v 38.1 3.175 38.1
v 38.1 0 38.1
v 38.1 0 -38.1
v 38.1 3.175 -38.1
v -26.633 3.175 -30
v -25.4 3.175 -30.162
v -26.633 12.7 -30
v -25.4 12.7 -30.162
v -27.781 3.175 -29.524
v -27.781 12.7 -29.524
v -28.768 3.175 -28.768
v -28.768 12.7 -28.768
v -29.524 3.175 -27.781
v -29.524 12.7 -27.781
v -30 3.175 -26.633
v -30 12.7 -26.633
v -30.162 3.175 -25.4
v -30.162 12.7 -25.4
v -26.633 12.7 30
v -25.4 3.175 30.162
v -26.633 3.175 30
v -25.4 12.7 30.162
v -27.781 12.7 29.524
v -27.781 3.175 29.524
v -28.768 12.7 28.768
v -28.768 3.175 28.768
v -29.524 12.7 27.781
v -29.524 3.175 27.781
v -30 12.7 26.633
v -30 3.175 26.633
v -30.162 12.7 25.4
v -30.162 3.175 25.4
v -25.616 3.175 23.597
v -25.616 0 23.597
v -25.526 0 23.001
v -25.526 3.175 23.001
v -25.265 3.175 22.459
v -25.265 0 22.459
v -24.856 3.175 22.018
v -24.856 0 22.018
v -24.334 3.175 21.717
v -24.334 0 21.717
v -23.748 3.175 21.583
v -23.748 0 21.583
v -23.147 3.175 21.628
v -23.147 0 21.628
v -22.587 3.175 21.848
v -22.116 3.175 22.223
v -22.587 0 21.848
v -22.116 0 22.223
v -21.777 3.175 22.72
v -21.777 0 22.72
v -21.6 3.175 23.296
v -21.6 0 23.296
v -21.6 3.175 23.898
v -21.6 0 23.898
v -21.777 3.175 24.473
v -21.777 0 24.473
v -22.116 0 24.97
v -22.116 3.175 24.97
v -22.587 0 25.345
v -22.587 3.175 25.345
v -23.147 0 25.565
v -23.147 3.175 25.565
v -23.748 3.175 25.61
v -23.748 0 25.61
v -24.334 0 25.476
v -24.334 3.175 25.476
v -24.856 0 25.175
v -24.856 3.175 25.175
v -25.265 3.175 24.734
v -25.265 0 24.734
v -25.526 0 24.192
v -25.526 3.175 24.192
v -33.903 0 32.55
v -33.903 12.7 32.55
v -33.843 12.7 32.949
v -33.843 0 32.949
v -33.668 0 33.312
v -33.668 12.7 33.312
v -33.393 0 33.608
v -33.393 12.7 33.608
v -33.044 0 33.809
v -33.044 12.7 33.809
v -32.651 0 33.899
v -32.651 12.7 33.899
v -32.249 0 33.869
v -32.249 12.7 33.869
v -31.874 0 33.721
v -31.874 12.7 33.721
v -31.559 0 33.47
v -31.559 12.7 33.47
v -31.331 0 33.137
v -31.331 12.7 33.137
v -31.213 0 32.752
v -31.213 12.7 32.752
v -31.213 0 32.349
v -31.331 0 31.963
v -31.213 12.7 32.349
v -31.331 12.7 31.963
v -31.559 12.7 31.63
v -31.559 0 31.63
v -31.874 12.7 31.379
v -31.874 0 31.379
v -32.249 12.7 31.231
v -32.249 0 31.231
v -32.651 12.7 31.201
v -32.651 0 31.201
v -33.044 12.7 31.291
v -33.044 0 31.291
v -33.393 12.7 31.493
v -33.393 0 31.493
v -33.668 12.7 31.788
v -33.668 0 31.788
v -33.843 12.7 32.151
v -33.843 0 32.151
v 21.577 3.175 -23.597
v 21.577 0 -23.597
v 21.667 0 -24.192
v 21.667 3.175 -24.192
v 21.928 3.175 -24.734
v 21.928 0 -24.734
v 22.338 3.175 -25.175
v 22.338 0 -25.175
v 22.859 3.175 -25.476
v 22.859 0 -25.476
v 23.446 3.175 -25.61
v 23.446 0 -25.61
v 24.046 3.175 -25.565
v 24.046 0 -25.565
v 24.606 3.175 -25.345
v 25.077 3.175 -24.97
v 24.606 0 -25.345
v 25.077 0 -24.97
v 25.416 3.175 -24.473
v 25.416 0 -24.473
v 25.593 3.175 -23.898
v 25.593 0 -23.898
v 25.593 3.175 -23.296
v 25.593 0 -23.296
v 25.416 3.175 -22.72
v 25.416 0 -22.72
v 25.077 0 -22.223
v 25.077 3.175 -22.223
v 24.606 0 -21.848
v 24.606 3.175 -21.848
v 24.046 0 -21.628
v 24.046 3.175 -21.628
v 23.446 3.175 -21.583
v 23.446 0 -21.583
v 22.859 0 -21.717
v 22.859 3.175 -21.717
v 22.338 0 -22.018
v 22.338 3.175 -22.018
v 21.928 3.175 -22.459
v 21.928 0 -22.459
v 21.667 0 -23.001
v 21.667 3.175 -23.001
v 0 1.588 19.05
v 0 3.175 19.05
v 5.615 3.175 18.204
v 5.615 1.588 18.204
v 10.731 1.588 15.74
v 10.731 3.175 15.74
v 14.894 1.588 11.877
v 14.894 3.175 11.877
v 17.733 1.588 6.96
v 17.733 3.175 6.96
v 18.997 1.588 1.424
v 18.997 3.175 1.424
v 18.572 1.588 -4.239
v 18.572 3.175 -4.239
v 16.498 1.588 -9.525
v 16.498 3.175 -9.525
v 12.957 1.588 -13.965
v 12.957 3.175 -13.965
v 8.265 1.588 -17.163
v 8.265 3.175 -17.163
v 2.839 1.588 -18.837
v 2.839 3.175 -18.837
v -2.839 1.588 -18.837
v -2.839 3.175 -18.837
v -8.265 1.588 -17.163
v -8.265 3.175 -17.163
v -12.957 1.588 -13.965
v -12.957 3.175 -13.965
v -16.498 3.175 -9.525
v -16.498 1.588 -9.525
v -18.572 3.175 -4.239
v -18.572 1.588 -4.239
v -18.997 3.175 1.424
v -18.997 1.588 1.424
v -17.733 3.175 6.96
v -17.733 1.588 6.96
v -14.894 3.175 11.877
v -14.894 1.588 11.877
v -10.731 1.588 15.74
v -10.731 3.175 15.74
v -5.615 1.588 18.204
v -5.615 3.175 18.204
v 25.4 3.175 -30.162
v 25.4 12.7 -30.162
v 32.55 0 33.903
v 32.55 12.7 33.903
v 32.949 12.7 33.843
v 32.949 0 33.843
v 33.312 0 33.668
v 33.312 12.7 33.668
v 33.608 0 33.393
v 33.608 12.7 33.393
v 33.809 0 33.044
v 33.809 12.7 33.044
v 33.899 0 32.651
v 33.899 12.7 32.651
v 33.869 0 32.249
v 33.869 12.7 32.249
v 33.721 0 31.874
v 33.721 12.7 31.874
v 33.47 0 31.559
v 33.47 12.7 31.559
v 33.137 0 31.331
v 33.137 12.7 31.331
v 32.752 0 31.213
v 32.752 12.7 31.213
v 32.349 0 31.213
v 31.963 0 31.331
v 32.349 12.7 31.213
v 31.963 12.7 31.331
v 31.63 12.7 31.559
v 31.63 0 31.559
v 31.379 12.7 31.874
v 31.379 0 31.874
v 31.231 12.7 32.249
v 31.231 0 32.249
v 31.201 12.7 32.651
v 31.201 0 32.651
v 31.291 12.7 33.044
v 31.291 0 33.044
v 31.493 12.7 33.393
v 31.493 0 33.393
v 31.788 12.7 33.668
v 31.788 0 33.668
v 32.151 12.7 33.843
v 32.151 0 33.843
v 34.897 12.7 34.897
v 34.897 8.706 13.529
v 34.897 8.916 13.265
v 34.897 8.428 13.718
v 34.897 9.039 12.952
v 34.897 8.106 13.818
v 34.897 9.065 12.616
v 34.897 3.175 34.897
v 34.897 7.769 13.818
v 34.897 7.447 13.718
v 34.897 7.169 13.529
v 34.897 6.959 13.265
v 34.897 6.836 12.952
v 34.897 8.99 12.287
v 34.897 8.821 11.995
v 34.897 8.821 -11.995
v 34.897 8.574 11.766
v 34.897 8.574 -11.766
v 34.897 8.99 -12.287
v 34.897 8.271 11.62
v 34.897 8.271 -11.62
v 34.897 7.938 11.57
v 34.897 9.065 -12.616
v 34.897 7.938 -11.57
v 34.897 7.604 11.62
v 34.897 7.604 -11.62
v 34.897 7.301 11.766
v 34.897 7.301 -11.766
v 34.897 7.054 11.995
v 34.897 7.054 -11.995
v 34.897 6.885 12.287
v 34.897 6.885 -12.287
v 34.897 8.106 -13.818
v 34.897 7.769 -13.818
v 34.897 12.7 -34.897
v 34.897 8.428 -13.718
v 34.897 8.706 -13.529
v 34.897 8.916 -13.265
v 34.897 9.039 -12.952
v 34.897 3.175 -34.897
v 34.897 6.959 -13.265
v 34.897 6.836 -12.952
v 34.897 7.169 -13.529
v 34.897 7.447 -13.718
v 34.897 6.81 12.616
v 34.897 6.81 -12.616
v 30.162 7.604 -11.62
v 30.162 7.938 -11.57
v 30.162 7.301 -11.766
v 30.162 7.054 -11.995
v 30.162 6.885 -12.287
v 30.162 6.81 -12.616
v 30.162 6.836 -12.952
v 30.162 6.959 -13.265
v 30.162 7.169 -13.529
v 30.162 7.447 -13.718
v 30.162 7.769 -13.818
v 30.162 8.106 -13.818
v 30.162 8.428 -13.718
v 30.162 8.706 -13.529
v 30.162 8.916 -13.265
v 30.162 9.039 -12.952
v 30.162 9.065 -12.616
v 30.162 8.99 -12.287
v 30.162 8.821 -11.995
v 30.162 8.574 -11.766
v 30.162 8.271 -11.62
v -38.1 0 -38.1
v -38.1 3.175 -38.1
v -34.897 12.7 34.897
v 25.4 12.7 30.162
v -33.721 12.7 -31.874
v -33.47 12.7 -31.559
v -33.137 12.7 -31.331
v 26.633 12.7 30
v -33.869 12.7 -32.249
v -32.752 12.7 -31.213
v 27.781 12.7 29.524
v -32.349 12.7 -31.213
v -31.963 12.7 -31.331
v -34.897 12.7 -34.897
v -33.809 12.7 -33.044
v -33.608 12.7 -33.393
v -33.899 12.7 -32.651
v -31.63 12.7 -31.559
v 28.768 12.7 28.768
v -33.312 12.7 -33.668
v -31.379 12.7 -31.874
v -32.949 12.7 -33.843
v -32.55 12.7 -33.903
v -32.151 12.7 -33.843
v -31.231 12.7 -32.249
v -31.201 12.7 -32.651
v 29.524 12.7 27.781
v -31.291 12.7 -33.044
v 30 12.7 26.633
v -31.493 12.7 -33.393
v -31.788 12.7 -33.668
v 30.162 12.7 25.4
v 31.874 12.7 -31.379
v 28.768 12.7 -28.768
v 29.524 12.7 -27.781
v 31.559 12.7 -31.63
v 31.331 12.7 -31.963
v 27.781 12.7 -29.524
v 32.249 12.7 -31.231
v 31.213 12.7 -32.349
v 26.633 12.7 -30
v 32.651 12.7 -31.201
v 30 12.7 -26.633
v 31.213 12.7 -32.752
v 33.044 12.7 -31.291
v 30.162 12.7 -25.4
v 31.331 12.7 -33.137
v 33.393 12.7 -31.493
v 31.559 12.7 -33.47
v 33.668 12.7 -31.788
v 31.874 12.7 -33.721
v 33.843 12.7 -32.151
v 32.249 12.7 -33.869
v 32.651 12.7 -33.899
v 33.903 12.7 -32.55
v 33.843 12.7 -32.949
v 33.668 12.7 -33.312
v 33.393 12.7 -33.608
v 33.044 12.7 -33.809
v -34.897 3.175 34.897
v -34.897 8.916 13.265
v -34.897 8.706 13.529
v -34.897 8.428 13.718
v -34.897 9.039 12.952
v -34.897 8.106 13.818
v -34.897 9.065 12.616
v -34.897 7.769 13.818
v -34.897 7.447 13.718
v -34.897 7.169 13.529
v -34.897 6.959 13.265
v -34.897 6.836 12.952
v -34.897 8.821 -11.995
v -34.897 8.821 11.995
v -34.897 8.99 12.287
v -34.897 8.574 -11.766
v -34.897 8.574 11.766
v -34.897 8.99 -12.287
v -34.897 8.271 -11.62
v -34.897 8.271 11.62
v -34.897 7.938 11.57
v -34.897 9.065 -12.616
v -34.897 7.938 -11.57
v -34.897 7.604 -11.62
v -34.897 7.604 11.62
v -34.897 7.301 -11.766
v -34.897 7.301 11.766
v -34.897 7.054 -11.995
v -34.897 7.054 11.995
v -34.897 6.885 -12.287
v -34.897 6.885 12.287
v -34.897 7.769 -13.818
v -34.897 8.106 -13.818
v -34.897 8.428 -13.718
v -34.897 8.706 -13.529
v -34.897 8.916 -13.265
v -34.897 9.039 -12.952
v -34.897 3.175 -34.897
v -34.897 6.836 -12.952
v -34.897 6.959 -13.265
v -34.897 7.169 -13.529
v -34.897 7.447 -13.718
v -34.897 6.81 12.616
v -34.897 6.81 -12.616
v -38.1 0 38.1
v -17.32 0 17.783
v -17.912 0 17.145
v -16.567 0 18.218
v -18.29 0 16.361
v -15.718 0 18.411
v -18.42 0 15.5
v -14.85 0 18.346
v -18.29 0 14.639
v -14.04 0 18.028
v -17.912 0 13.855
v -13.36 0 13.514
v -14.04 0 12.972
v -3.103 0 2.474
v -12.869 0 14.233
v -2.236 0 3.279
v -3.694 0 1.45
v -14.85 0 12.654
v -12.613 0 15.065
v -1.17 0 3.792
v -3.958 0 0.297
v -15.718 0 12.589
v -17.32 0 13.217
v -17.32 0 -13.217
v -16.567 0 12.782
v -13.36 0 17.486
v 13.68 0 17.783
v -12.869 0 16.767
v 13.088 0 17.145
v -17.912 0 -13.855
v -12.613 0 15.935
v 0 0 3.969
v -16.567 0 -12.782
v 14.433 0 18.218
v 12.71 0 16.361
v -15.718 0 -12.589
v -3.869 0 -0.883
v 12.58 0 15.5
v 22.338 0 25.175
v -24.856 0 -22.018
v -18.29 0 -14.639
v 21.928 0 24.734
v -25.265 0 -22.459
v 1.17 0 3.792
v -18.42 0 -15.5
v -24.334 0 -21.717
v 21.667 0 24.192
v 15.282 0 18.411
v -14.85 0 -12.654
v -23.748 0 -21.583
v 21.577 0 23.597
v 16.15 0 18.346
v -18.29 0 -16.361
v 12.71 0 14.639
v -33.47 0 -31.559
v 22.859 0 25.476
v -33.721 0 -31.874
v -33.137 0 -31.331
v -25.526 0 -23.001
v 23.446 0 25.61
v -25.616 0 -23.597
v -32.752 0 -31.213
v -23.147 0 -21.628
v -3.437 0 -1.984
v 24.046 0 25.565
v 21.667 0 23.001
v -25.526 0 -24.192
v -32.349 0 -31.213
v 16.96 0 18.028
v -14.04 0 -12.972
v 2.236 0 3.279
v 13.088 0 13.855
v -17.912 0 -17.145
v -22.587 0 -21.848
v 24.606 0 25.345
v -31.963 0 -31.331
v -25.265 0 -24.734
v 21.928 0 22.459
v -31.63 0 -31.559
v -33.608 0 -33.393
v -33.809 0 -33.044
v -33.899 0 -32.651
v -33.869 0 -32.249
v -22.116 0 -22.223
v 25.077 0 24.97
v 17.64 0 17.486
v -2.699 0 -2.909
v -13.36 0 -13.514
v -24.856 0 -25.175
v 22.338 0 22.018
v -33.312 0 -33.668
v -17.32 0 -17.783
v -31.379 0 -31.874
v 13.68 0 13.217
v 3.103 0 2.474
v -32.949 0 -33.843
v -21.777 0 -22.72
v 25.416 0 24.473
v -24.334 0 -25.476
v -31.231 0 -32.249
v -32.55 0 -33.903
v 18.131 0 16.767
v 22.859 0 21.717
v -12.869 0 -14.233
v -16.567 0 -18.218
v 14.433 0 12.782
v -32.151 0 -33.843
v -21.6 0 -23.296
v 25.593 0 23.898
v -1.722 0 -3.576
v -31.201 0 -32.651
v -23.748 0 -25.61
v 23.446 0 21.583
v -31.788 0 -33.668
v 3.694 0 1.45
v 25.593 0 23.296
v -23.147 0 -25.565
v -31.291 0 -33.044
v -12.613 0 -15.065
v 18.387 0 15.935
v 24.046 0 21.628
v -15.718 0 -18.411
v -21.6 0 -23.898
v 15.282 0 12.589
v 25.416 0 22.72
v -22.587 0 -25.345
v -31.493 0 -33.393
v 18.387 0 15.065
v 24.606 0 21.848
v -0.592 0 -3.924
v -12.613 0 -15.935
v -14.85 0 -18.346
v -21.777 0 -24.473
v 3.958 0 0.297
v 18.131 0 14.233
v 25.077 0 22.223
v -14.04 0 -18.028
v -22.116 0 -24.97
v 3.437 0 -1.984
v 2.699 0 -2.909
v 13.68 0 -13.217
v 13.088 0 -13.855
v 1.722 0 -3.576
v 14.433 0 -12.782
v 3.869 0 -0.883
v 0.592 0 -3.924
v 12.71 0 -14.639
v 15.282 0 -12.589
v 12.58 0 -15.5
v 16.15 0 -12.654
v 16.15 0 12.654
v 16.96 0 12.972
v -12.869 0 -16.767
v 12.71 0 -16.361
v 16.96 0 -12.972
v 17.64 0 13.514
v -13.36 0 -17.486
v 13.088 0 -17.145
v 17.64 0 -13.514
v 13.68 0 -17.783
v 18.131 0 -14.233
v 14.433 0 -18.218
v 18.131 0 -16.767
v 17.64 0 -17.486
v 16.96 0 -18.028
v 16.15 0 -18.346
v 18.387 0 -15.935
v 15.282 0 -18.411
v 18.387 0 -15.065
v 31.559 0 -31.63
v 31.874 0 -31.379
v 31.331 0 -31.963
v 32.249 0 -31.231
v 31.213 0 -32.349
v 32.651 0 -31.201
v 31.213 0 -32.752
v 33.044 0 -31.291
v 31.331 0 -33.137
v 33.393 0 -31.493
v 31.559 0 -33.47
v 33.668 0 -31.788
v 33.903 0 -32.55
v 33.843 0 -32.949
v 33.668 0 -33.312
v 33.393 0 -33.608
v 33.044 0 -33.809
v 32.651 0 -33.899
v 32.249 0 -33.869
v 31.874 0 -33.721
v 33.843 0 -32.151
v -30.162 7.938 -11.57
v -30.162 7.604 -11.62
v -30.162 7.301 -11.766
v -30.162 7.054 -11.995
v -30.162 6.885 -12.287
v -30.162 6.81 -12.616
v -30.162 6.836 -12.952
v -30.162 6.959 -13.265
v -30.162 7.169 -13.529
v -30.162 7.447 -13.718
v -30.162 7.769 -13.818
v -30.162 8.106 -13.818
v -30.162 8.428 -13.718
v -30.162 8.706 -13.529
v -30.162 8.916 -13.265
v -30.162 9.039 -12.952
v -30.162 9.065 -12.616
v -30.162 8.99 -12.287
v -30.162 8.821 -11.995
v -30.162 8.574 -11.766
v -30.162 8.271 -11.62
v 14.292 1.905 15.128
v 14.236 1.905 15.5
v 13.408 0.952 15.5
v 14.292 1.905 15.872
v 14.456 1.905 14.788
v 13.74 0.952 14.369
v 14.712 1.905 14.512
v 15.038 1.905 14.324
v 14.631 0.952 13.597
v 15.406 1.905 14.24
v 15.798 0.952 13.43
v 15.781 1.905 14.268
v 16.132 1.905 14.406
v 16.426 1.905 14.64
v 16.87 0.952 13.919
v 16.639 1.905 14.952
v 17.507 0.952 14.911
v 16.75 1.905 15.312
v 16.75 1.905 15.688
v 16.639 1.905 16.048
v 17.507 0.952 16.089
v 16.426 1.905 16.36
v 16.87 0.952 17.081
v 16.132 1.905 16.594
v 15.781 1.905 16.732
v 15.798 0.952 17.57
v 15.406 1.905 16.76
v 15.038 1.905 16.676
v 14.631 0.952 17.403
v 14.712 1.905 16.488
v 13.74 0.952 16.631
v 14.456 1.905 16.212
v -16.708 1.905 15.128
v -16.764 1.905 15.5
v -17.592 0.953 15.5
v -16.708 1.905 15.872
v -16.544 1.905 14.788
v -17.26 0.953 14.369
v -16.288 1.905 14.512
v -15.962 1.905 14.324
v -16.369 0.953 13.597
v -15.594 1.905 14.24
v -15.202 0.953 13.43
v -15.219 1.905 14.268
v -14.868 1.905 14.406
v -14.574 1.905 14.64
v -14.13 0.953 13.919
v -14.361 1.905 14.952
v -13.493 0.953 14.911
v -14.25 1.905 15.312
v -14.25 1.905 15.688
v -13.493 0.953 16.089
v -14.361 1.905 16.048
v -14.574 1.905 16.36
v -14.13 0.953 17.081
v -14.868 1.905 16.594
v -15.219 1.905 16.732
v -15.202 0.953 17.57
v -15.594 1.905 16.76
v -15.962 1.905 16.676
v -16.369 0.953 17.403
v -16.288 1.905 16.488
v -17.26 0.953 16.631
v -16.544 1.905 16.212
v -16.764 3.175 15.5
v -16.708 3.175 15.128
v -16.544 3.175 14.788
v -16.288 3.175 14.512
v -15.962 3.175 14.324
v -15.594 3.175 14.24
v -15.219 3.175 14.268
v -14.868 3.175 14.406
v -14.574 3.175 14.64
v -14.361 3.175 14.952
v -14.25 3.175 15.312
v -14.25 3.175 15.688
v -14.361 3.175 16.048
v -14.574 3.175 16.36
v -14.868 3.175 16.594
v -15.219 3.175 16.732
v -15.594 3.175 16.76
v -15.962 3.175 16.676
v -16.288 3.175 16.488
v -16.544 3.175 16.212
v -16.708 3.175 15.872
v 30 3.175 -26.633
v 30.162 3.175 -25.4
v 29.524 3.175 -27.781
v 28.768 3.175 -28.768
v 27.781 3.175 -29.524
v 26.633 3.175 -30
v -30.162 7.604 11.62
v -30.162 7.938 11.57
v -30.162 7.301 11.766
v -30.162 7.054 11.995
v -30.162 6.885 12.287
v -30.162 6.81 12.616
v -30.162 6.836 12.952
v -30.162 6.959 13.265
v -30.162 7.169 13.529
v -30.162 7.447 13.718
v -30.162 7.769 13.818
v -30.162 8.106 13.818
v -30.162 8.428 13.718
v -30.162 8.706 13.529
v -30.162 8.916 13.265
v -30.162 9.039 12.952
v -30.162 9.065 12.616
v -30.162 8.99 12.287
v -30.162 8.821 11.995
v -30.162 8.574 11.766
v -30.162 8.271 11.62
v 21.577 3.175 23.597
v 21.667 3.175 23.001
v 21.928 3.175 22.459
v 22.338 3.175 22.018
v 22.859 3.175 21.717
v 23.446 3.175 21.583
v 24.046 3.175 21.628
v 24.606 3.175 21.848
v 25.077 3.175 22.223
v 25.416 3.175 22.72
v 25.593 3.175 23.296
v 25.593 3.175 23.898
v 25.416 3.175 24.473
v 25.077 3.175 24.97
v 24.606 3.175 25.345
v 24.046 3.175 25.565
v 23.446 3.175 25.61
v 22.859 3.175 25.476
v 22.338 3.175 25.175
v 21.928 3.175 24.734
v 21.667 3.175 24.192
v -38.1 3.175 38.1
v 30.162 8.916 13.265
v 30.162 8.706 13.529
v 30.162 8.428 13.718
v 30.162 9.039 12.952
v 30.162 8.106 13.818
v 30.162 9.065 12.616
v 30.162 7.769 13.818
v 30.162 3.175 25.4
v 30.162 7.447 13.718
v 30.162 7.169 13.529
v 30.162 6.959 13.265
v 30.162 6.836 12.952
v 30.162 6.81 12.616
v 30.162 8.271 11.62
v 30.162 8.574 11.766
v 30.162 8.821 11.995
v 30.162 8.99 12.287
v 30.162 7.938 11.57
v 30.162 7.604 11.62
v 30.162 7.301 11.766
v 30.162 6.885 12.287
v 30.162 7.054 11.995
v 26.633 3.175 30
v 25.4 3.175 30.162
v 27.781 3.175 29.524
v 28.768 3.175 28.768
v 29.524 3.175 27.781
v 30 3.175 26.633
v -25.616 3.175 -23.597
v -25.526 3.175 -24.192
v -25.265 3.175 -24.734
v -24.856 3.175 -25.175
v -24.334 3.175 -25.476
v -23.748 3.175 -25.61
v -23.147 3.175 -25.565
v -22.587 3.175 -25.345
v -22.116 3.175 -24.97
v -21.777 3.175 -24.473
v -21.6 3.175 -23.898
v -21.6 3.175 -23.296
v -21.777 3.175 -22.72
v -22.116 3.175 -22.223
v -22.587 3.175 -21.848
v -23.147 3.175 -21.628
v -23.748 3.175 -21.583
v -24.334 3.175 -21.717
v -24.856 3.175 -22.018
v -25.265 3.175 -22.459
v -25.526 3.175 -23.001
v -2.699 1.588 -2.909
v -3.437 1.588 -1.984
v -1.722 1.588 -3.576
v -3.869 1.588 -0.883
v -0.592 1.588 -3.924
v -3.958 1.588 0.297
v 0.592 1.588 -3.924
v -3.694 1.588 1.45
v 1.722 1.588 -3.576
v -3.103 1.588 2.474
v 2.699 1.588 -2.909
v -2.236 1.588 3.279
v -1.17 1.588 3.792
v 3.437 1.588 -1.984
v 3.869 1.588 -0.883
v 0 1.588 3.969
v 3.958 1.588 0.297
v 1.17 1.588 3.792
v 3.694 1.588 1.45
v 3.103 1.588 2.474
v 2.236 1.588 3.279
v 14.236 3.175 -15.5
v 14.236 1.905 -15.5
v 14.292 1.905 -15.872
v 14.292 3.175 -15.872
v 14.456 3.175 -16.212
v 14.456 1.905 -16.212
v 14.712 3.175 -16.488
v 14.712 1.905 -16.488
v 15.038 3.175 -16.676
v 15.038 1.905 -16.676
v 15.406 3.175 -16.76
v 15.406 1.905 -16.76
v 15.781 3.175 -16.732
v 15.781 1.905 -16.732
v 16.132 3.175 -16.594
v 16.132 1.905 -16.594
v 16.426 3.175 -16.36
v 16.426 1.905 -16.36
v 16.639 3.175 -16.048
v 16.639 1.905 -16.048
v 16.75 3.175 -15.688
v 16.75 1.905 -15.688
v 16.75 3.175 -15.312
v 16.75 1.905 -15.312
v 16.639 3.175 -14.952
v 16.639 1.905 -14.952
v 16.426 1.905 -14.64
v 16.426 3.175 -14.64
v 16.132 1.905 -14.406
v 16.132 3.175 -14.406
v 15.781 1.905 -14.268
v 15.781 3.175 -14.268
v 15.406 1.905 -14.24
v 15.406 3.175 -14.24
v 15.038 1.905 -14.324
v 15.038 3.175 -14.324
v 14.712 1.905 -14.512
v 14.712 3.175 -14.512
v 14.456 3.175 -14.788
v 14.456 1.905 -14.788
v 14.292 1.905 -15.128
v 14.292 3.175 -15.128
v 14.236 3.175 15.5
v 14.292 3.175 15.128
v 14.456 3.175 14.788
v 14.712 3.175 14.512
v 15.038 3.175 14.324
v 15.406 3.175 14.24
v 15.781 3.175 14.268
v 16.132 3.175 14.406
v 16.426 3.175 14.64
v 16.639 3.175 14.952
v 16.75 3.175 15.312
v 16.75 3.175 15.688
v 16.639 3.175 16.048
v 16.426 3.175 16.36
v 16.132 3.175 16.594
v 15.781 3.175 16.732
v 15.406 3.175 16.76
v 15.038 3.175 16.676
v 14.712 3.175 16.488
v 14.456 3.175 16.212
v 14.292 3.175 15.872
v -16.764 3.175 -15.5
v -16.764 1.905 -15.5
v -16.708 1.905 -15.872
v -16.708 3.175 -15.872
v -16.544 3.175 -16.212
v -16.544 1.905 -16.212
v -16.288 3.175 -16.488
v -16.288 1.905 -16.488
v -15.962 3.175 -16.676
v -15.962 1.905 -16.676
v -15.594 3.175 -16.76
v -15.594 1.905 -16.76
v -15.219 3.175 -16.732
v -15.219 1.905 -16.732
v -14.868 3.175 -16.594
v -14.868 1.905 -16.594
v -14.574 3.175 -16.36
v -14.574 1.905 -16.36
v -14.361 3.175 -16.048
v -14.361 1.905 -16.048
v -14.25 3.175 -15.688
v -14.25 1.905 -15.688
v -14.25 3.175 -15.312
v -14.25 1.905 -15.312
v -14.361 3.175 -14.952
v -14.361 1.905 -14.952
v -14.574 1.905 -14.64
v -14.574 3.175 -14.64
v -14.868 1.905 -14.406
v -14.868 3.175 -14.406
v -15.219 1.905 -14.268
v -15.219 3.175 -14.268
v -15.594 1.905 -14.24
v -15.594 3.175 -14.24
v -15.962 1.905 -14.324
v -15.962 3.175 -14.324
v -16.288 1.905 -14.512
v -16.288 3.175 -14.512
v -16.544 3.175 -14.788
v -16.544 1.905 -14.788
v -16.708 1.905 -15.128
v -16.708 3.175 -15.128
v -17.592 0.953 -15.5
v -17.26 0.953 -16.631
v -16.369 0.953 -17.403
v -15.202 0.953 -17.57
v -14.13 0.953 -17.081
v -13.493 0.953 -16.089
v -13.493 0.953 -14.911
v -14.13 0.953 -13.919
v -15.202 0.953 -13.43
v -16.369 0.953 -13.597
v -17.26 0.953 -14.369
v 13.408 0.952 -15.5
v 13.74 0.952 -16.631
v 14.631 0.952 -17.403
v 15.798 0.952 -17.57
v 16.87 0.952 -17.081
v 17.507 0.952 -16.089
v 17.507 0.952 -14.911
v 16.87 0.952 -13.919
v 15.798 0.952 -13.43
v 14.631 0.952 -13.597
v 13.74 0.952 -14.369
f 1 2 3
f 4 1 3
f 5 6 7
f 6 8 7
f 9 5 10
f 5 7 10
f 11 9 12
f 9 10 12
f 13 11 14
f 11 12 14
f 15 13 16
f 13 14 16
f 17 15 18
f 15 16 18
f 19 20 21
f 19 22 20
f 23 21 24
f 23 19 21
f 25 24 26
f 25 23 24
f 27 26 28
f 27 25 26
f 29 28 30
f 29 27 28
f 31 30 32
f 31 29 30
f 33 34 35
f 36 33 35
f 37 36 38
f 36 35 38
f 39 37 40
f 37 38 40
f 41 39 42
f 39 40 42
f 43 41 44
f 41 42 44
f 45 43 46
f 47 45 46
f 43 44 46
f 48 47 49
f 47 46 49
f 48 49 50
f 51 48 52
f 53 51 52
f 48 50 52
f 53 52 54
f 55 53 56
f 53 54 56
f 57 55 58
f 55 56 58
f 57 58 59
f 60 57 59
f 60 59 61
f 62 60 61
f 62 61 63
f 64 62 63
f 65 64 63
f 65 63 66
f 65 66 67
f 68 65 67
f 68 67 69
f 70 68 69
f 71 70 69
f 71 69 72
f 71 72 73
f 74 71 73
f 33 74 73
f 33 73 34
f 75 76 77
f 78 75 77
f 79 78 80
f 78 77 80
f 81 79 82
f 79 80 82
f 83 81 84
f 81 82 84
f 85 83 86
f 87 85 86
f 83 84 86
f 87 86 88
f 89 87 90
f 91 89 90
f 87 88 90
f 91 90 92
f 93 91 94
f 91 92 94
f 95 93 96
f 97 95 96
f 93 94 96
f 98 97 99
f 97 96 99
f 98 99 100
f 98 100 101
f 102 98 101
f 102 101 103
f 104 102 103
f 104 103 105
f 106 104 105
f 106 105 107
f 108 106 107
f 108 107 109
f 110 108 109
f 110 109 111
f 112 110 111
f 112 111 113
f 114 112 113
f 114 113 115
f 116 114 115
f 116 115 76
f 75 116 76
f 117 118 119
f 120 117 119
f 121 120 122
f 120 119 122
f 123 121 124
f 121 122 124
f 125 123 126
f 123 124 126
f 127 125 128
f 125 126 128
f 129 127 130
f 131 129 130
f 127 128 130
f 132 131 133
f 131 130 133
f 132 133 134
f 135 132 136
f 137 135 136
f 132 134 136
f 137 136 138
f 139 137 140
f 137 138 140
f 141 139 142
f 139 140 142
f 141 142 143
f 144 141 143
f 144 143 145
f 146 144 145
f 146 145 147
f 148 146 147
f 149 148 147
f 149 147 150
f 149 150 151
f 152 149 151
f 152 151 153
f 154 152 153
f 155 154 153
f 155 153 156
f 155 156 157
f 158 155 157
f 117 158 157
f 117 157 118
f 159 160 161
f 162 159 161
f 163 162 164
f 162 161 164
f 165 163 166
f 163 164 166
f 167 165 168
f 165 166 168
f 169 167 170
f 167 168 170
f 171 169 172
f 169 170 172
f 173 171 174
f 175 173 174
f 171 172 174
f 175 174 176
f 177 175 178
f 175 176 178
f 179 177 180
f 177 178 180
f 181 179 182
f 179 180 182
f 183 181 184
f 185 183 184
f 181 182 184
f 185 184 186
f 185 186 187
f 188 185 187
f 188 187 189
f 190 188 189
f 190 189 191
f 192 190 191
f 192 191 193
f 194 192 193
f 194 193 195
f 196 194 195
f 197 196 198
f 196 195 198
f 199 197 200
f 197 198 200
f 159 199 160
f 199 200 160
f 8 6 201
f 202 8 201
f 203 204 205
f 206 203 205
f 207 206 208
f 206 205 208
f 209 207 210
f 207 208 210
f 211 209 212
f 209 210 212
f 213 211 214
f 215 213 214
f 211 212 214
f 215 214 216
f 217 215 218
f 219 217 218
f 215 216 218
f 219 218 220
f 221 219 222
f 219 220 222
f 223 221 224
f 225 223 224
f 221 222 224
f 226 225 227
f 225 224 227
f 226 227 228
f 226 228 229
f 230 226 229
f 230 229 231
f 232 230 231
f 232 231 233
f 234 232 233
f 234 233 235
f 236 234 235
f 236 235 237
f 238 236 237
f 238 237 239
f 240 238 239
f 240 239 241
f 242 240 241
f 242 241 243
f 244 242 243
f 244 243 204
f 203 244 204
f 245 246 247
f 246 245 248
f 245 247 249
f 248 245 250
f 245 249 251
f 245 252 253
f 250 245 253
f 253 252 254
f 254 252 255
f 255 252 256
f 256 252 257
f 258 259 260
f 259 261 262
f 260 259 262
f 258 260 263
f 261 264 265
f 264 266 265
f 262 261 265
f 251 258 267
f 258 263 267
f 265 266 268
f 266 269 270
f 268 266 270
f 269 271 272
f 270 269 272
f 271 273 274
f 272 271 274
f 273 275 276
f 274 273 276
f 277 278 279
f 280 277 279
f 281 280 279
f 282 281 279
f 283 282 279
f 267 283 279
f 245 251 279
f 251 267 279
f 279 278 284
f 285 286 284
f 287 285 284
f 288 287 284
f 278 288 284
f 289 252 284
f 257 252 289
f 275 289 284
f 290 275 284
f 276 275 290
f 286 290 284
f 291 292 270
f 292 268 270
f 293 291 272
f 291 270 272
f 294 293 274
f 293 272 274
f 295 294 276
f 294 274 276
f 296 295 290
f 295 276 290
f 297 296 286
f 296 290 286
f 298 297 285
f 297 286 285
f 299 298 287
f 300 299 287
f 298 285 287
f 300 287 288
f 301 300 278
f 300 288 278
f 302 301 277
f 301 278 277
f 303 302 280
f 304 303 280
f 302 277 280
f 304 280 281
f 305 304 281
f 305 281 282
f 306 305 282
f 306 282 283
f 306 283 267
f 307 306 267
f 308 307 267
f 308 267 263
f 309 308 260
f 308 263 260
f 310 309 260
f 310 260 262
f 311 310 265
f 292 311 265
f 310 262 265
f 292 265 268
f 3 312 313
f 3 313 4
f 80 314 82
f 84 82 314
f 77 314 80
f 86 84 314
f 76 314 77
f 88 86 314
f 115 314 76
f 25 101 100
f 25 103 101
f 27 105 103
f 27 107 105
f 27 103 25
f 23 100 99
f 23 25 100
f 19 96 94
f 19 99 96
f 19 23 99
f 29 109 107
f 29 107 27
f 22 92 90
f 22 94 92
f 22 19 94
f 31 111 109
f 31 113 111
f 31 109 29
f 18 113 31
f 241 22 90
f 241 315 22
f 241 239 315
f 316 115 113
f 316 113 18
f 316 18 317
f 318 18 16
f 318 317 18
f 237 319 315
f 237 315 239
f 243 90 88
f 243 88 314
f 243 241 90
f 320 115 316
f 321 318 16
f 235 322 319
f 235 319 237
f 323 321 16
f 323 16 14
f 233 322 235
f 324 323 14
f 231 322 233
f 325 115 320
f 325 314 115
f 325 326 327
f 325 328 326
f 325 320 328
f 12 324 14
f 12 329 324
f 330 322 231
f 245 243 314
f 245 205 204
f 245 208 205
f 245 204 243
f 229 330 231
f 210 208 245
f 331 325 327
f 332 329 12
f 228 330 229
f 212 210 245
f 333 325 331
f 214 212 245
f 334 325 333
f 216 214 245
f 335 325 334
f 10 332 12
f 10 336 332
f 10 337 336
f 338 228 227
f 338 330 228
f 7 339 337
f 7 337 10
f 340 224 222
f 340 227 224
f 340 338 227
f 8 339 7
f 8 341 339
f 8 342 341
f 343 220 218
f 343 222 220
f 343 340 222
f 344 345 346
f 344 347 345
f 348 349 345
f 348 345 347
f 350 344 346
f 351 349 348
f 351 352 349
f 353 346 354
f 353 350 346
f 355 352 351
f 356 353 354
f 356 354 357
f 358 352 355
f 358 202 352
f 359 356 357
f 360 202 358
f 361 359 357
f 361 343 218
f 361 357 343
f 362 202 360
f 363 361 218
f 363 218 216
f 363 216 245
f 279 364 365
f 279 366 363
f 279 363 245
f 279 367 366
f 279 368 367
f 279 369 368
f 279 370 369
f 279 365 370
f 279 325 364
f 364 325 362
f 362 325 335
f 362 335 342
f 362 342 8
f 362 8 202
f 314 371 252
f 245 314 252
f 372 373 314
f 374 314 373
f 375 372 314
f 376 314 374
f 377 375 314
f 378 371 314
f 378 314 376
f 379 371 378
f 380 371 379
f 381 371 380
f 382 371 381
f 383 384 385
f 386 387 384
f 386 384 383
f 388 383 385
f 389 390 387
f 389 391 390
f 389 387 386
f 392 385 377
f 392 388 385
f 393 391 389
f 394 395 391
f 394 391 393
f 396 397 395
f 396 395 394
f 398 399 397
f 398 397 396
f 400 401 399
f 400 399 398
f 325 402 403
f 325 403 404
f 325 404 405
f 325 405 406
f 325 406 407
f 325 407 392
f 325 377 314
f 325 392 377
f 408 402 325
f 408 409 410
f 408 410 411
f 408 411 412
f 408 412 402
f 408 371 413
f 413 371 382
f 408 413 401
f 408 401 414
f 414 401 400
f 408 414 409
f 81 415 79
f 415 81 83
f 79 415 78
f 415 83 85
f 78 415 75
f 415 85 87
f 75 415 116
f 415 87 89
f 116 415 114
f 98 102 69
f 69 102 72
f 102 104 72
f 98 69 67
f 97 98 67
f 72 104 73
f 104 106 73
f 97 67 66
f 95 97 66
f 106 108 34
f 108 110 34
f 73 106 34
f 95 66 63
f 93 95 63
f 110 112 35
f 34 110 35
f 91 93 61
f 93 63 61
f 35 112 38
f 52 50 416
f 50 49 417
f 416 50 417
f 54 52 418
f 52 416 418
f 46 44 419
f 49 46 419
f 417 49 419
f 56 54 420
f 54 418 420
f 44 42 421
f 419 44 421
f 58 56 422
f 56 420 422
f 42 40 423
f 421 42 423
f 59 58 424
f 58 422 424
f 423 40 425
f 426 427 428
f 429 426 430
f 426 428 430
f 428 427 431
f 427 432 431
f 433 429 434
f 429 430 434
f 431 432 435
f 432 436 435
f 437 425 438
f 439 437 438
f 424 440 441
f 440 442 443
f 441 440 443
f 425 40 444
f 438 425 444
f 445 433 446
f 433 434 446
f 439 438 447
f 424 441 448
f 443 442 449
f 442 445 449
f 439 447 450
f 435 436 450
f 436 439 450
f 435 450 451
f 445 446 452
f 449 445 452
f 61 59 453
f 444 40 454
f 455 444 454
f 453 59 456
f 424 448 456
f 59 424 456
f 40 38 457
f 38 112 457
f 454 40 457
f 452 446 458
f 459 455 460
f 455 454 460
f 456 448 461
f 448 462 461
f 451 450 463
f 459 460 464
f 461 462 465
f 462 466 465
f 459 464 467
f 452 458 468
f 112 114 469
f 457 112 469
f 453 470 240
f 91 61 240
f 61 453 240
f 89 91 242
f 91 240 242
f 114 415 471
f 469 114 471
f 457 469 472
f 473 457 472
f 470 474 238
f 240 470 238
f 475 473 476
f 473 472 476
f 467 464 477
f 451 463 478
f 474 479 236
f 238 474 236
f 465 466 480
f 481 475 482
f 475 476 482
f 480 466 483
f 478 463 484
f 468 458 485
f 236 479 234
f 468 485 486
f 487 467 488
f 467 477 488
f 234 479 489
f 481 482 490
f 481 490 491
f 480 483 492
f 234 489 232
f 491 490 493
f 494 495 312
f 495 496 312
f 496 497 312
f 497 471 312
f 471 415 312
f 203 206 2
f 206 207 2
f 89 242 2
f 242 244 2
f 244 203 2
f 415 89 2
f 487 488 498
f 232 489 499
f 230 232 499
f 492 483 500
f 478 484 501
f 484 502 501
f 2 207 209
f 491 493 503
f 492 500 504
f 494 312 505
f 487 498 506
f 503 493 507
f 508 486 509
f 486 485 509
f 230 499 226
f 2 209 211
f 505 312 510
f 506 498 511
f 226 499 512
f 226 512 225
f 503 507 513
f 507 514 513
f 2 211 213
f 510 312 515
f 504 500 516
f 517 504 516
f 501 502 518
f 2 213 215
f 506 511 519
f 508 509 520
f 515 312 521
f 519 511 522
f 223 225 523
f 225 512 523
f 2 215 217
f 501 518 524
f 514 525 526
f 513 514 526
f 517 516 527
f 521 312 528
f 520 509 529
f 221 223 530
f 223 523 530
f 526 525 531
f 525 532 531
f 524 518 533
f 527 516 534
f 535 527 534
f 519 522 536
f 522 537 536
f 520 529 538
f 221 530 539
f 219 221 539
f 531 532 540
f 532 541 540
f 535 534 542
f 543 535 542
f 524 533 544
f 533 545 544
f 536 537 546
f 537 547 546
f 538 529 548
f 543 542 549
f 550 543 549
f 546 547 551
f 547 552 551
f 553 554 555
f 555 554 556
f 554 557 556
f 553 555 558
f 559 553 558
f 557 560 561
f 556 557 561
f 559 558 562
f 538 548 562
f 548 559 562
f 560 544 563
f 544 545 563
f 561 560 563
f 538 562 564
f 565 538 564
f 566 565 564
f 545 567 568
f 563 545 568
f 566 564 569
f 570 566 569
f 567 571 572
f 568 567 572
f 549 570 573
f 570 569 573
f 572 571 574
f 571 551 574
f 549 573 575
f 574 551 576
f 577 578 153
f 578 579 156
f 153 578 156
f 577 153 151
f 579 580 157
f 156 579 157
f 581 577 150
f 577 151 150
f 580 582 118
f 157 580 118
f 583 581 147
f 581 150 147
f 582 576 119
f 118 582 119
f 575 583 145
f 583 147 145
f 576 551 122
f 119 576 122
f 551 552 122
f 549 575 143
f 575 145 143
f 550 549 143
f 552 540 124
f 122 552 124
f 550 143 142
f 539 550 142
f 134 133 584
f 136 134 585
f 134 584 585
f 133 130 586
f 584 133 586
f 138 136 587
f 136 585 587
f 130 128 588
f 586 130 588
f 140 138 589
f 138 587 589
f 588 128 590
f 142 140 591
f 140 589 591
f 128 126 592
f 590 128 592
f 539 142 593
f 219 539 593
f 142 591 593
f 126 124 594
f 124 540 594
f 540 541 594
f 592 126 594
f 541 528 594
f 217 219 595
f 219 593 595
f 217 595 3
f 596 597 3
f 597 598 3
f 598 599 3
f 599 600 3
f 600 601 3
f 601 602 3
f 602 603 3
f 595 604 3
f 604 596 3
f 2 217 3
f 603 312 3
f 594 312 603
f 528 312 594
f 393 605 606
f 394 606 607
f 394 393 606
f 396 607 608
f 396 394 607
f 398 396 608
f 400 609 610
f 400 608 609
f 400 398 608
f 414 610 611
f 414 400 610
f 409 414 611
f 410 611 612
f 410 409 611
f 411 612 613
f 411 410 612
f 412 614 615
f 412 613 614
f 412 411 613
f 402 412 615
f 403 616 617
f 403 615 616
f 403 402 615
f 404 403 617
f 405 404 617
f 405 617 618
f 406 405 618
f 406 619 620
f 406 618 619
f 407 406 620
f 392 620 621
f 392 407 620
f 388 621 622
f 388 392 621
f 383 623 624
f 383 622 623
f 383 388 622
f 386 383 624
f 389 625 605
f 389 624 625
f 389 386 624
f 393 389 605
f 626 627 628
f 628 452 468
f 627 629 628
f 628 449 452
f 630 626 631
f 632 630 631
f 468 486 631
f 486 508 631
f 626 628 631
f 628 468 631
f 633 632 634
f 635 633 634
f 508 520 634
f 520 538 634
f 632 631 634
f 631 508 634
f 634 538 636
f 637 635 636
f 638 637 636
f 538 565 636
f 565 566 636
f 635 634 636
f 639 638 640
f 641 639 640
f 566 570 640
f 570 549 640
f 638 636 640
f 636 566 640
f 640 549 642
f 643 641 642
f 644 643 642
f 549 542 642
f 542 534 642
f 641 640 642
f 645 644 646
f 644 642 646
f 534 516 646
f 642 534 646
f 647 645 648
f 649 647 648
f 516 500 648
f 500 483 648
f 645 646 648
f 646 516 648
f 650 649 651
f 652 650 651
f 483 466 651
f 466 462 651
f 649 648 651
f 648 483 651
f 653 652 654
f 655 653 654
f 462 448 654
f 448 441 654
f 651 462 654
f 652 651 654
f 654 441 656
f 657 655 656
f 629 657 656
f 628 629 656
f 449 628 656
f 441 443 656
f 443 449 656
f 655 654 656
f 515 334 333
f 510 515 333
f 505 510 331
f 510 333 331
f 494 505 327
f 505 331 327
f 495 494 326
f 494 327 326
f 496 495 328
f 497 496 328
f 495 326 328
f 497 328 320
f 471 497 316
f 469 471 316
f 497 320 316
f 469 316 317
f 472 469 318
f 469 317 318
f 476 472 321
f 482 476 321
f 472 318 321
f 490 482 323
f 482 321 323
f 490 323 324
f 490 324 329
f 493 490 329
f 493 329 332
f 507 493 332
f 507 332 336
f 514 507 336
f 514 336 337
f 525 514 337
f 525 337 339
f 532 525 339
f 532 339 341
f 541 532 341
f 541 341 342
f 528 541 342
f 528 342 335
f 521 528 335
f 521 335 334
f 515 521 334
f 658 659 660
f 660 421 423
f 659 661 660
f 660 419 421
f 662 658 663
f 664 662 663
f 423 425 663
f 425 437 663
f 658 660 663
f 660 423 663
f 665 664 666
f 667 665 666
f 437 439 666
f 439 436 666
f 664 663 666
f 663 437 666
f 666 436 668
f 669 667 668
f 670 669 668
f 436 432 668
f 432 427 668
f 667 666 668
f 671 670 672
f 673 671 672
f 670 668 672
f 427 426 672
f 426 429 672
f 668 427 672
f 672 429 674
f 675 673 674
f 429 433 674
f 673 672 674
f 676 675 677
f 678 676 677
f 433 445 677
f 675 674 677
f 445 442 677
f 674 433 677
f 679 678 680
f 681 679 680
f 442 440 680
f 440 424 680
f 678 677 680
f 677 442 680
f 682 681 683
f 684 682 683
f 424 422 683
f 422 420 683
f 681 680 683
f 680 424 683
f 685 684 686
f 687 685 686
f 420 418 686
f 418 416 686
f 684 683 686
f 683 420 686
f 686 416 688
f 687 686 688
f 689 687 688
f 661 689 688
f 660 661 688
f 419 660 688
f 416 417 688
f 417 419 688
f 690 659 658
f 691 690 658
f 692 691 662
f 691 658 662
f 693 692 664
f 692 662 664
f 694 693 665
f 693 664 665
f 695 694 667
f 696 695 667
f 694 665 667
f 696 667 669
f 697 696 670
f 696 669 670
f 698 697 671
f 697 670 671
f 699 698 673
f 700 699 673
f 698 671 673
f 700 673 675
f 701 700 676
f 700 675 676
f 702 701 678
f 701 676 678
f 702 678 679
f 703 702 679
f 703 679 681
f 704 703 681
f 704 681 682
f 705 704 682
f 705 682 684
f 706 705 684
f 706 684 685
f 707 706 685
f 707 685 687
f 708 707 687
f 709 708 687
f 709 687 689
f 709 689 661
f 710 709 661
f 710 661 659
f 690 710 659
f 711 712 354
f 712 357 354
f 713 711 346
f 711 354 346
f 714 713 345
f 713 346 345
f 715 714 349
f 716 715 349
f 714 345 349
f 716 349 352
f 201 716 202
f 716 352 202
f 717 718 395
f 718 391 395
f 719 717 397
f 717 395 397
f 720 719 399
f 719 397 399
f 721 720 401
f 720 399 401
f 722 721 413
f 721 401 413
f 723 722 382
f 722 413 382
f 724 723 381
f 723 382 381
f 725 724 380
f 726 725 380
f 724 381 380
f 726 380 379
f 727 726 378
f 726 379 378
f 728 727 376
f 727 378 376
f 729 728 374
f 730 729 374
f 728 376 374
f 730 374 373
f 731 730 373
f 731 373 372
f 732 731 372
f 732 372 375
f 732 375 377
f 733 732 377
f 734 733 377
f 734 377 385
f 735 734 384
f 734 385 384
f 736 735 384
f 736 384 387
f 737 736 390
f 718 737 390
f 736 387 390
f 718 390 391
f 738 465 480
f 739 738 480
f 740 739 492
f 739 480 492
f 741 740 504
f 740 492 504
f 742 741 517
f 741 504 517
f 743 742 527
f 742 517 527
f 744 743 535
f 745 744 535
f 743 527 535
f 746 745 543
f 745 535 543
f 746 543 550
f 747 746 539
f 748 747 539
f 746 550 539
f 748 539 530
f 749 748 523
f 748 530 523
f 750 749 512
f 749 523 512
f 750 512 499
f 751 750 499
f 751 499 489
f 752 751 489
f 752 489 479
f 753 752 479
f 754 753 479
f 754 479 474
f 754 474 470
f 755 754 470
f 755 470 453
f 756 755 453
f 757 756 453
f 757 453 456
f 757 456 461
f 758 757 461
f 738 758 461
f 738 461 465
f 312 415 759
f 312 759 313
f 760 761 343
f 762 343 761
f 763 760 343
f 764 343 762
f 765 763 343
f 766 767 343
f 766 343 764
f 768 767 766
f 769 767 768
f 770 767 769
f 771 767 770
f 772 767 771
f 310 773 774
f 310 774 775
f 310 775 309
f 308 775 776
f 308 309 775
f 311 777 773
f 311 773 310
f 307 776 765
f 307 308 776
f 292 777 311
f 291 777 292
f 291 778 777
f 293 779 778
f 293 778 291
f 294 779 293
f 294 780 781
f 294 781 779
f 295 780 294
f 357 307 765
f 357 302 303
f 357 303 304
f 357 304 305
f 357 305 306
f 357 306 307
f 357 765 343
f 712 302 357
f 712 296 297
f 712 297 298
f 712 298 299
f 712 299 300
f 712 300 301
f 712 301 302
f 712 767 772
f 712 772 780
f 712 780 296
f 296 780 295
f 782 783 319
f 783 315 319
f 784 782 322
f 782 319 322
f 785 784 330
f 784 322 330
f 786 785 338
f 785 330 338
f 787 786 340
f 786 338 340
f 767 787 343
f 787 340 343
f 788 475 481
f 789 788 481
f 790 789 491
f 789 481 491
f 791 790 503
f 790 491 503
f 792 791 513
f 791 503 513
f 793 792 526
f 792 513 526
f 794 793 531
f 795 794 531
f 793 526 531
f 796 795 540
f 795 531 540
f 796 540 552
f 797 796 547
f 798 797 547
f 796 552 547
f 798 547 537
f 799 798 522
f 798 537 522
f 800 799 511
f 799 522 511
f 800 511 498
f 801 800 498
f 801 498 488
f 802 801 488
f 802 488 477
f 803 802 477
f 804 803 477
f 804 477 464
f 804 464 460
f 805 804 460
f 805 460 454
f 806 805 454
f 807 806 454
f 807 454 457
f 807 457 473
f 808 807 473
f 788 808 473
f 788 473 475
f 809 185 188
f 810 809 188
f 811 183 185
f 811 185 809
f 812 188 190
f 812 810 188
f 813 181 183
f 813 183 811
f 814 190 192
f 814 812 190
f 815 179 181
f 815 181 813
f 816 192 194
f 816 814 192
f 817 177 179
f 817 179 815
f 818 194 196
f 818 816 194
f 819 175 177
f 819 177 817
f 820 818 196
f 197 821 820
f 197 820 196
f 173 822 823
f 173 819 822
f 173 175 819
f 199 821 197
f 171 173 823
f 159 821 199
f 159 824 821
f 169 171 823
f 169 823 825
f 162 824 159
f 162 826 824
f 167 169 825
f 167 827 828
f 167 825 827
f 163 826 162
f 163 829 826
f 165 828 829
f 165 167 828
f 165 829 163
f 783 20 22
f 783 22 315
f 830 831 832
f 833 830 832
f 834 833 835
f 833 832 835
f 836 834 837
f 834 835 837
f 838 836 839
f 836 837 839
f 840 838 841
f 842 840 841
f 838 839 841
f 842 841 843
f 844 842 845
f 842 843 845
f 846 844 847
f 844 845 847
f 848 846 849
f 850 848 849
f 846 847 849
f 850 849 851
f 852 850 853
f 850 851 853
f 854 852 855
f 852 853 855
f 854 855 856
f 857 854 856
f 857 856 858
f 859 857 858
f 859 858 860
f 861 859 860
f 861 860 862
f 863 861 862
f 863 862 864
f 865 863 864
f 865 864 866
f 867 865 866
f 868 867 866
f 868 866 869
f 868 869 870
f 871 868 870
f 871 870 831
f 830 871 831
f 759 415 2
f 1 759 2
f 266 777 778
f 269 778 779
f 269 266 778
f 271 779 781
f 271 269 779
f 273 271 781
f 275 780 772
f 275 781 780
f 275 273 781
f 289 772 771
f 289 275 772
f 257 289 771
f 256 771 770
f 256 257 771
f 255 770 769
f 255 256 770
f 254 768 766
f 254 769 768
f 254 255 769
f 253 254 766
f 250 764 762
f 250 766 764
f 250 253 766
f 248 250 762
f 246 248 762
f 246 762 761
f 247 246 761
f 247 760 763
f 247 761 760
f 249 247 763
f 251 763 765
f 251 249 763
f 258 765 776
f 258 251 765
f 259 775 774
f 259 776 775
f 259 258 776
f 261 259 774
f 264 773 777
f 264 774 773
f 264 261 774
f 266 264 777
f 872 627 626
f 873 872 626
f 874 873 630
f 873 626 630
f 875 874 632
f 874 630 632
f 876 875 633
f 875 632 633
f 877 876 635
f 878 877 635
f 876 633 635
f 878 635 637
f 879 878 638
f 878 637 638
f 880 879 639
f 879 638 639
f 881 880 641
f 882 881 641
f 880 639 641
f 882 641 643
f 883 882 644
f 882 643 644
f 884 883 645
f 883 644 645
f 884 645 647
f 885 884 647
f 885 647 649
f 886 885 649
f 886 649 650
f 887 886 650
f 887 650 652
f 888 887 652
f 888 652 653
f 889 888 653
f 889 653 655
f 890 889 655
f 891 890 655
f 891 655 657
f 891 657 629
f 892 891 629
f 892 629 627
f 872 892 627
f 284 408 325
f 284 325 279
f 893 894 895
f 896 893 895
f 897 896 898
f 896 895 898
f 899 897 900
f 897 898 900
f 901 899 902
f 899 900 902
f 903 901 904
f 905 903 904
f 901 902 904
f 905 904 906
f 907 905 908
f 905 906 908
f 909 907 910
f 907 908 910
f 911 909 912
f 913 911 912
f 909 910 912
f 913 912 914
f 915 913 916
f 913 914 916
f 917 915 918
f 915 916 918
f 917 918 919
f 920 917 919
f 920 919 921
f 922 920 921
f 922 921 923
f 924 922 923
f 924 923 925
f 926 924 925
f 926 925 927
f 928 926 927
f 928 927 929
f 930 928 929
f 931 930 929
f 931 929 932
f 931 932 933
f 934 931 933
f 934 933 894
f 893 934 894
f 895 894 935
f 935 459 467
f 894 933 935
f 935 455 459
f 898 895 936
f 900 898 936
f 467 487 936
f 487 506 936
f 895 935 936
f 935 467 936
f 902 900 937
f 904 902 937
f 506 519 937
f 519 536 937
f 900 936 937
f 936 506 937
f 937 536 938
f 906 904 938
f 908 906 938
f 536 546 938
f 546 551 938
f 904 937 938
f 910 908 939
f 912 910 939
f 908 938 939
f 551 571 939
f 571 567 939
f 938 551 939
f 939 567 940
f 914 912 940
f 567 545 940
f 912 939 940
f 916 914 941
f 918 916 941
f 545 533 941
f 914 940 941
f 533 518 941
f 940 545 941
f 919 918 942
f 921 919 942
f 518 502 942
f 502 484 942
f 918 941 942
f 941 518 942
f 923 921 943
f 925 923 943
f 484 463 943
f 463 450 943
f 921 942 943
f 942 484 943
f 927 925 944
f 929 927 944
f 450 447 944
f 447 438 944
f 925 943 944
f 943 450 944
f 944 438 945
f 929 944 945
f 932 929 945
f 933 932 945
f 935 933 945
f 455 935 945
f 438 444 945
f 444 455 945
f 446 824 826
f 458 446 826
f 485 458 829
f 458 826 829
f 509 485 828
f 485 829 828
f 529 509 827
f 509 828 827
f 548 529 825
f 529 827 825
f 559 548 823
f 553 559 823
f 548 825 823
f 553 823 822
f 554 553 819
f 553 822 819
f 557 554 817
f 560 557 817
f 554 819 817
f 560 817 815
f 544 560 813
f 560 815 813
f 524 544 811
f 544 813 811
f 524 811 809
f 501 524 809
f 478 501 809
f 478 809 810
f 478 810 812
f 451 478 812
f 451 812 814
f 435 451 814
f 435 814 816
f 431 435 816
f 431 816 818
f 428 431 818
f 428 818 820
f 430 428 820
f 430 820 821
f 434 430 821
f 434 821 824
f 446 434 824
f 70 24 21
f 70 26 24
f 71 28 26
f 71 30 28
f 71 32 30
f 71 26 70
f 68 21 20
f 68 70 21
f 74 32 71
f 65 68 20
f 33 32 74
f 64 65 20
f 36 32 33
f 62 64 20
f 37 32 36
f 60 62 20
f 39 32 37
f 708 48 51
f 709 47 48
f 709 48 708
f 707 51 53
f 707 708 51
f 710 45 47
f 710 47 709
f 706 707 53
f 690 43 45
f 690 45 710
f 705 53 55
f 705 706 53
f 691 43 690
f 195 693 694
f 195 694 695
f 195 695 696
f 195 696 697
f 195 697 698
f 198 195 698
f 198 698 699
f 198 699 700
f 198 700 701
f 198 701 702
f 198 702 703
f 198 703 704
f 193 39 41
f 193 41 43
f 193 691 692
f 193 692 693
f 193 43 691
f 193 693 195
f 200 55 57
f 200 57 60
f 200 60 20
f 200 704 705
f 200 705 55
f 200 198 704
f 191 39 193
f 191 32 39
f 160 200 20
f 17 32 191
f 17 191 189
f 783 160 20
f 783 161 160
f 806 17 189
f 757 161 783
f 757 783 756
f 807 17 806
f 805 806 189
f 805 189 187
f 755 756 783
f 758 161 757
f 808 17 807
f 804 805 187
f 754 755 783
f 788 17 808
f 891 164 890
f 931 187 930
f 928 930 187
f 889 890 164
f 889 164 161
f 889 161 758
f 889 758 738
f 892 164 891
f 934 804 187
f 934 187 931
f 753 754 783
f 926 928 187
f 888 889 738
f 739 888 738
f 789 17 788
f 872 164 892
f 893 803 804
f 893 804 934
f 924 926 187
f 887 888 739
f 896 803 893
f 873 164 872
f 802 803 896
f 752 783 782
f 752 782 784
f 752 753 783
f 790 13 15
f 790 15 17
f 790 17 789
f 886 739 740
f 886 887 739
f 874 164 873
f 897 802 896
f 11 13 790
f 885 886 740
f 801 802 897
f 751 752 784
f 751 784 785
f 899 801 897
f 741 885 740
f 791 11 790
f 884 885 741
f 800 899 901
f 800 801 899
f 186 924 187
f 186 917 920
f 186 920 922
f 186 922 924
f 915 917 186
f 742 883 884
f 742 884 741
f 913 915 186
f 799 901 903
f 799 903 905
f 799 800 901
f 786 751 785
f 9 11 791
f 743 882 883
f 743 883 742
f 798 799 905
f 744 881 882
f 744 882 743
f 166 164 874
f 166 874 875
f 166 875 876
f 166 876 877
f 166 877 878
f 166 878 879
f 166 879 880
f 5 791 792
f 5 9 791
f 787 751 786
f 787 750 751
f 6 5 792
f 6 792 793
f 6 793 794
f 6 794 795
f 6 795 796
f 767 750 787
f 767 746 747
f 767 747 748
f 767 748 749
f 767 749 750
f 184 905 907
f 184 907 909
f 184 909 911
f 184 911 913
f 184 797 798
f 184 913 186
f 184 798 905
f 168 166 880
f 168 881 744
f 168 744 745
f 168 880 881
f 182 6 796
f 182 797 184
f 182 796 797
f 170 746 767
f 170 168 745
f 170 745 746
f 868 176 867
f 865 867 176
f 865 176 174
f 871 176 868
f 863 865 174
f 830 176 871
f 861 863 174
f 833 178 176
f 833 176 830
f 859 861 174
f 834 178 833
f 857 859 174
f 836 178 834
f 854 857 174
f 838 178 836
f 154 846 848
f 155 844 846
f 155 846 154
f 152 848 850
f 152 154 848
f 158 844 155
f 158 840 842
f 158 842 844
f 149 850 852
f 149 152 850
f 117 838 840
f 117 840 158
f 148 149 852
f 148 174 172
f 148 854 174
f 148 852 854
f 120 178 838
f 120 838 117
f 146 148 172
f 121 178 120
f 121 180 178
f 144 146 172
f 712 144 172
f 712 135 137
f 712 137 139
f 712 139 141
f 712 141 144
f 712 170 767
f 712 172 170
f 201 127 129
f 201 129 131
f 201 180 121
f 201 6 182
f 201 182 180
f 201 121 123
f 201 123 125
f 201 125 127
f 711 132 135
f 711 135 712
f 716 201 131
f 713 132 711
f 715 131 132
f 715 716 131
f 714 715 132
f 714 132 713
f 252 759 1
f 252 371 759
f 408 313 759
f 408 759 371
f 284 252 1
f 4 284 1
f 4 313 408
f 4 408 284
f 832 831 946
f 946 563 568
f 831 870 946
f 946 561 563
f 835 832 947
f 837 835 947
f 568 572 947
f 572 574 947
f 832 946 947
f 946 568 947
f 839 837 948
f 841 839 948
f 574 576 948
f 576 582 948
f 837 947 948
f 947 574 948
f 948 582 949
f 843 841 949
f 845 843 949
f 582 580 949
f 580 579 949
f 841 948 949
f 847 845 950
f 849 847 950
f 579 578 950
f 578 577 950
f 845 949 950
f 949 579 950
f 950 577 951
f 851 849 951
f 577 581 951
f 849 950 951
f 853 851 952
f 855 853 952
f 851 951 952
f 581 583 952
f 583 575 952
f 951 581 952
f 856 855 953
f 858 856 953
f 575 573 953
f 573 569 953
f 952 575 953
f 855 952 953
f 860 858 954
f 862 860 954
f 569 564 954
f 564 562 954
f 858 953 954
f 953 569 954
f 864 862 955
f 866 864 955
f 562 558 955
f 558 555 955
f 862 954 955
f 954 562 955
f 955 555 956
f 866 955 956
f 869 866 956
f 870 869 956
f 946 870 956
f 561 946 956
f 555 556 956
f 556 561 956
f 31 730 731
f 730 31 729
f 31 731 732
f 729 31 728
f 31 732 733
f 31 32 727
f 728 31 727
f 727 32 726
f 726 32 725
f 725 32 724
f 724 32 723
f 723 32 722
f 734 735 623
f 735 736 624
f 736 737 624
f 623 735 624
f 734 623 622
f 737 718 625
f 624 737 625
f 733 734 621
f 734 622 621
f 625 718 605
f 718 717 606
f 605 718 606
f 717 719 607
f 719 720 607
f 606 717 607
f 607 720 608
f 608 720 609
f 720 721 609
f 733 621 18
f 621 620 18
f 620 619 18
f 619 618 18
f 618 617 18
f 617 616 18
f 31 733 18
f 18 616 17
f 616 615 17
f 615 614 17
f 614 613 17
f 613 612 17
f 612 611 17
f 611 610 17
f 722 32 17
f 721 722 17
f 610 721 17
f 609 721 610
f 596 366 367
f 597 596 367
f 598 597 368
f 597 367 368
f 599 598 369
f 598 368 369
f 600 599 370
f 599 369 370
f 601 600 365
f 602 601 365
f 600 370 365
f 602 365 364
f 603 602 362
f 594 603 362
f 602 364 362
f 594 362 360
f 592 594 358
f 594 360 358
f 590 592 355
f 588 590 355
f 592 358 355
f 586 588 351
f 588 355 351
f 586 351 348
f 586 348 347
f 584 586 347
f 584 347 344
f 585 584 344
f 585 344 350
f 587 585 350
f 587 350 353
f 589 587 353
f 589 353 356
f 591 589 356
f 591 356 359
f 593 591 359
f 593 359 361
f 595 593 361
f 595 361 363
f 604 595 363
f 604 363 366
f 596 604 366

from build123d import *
from OCP.BRepFilletAPI import BRepFilletAPI_MakeChamfer

# Parameters (mm, degrees)
SKETCH1_W                    = 76.2
SKETCH1_H                    = 76.2
BOSS_EXTRUDE1_DEPTH          = 3.175
SKETCH2_W                    = 69.79412
SKETCH2_H                    = 69.79412
SKETCH2_W_2                  = 60.325
SKETCH2_H_2                  = 60.325
BOSS_EXTRUDE2_DEPTH          = 9.525
FILLET1_R                    = 4.7625
SKETCH3_R                    = 19.05
CUT_EXTRUDE1_DEPTH           = 1.5875
SKETCH4_R                    = 3.96875
CUT_EXTRUDE2_DEPTH           = 56.015521957
F_39_0_0995_DIAMETER_HOLE1_D = 2.5273
F_10_32_TAPPED_HOLE1_D       = 4.0386
CHAMFER1_SIZE                = 1.905
CHAMFER1_SIZE2               = 1.655991236
F_6_32_TAPPED_HOLE1_D        = 2.7051
CIRPATTERN1_COUNT            = 4


with BuildPart() as part:
    # Sketch1 → Boss-Extrude1 (new body)
    with BuildSketch(Plane(origin=(0, 0, 0), x_dir=(1, 0, 0), z_dir=(0, 1, 0))):
        Rectangle(SKETCH1_W, SKETCH1_H)
    extrude(amount=BOSS_EXTRUDE1_DEPTH)

    # Sketch2 → Boss-Extrude2 (add)
    with BuildSketch(Plane(origin=(0, 3.175, 0), x_dir=(1, 0, 0), z_dir=(0, 1, 0))):
        Rectangle(SKETCH2_W, SKETCH2_H)
        Rectangle(SKETCH2_W_2, SKETCH2_H_2, mode=Mode.SUBTRACT)
    extrude(amount=BOSS_EXTRUDE2_DEPTH)

    # Fillet1
    fillet1_edges = [part.edges().sort_by_distance(p)[0] for p in [
        (-30.1625, 7.9375, 30.1625),
        (30.1625, 7.9375, 30.1625),
        (30.1625, 7.9375, -30.1625),
        (-30.1625, 7.9375, -30.1625),
    ]]
    fillet(fillet1_edges, radius=FILLET1_R)

    # Sketch3 → Cut-Extrude1 (cut)
    with BuildSketch(Plane(origin=(0, 3.175, 0), x_dir=(1, 0, 0), z_dir=(0, 1, 0))):
        with Locations(Location((0, 0, 0), (0, 0, 270))):
            Circle(SKETCH3_R)
    extrude(amount=-CUT_EXTRUDE1_DEPTH, mode=Mode.SUBTRACT)

    # Sketch4 → Cut-Extrude2 (cut, through all)
    with BuildSketch(Plane(origin=(0, 1.5875, 0), x_dir=(1, 0, 0), z_dir=(0, 1, 0))):
        with Locations(Location((0, 0, 0), (0, 0, 270))):
            Circle(SKETCH4_R)
    extrude(amount=-CUT_EXTRUDE2_DEPTH, mode=Mode.SUBTRACT)

    # #39 (0.0995) Diameter Hole1 (through all)
    with Locations(Plane(origin=(0, 3.175, 0), x_dir=(1, 0, 0), z_dir=(0, 1, 0))):
        with Locations((15.5, 15.5), (-15.5, 15.5), (-15.5, -15.5), (15.5, -15.5), (-23.5966, 23.5966), (23.5966, 23.5966), (23.5966, -23.5966), (-23.5966, -23.5966)):
            Hole(F_39_0_0995_DIAMETER_HOLE1_D / 2)

    # #10-32 Tapped Hole1 (through all)
    with Locations(Plane(origin=(0, 3.175, 0), x_dir=(1, 0, 0), z_dir=(0, 1, 0))):
        with Locations((-23.5966, 23.5966), (23.5966, 23.5966), (23.5966, -23.5966), (-23.5966, -23.5966)):
            Hole(F_10_32_TAPPED_HOLE1_D / 2)

    # Sketch9 → #4-40 Tapped Hole1 (revolve, cut)
    with BuildSketch(Plane(origin=(34.89706, 7.9375, 12.7), x_dir=(0, 0, -1), z_dir=(0, 1, 0))):
        Polygon((0, 0), (0, 7.283152758), (1.1303, 6.604), (1.1303, 0), align=None)
    f_4_40_tapped_hole1 = revolve(axis=Axis((41.24706, 7.9375, 12.7), (-1, 0, 0)), mode=Mode.SUBTRACT)

    # Mirror1: #4-40 Tapped Hole1 across plane
    add(f_4_40_tapped_hole1.mirror(Plane.XY), mode=Mode.SUBTRACT)

    # Mirror2: #4-40 Tapped Hole1 across plane
    add(f_4_40_tapped_hole1.mirror(Plane(origin=(0, 0, 0), x_dir=(0, 0, 1), z_dir=(1, 0, 0))), mode=Mode.SUBTRACT)

    # Mirror2 copy 1 sketch → Mirror2 copy 1 (revolve, cut)
    with BuildSketch(Plane(origin=(-34.89706, 7.9375, -12.7), x_dir=(0, 0, 1), z_dir=(0, 1, 0))):
        Polygon((0, 0), (0, 7.283152758), (1.1303, 6.604), (1.1303, 0), align=None)
    revolve(axis=Axis((-41.24706, 7.9375, -12.7), (1, 0, 0)), mode=Mode.SUBTRACT)

    # Chamfer1: one chamfer whose edges measure the first distance from different faces: ONE call of the kernel's chamfer builder (chamfer() names one face for all edges)
    chamfer1_edges_1 = [part.edges().sort_by_distance(p)[0] for p in [
        (16.76365, 0, 15.5),
    ]]
    chamfer1_side_1 = [part.faces().sort_by_distance(p)[0] for p in [
        (16.76365, 1.5875, 15.5),
    ]]
    chamfer1_edges_2 = [part.edges().sort_by_distance(p)[0] for p in [
        (-14.23635, 0, 15.5),
    ]]
    chamfer1_side_2 = [part.faces().sort_by_distance(p)[0] for p in [
        (-14.23635, 1.5875, 15.5),
    ]]
    chamfer1_edges_3 = [part.edges().sort_by_distance(p)[0] for p in [
        (-14.23635, 0, -15.5),
    ]]
    chamfer1_side_3 = [part.faces().sort_by_distance(p)[0] for p in [
        (-14.23635, 1.5875, -15.5),
    ]]
    chamfer1_edges_4 = [part.edges().sort_by_distance(p)[0] for p in [
        (16.76365, 0, -15.5),
    ]]
    chamfer1_side_4 = [part.faces().sort_by_distance(p)[0] for p in [
        (16.76365, 1.5875, -15.5),
    ]]
    chamfer1 = BRepFilletAPI_MakeChamfer(part.part.solid().wrapped)
    for e in chamfer1_edges_1:
        chamfer1.Add(CHAMFER1_SIZE, CHAMFER1_SIZE2, e.wrapped, chamfer1_side_1[0].wrapped)  # the first distance lies on this face
    for e in chamfer1_edges_2:
        chamfer1.Add(CHAMFER1_SIZE, CHAMFER1_SIZE2, e.wrapped, chamfer1_side_2[0].wrapped)  # the first distance lies on this face
    for e in chamfer1_edges_3:
        chamfer1.Add(CHAMFER1_SIZE, CHAMFER1_SIZE2, e.wrapped, chamfer1_side_3[0].wrapped)  # the first distance lies on this face
    for e in chamfer1_edges_4:
        chamfer1.Add(CHAMFER1_SIZE, CHAMFER1_SIZE2, e.wrapped, chamfer1_side_4[0].wrapped)  # the first distance lies on this face
    add(Compound.cast(chamfer1.Shape()), mode=Mode.REPLACE)

    # #6-32 Tapped Hole1 (through all)
    with Locations(Plane(origin=(0, 0, 0), x_dir=(-1, 0, 0), z_dir=(0, -1, 0))):
        with Locations((-32.5501, 32.5501)):
            f_6_32_tapped_hole1 = Hole(F_6_32_TAPPED_HOLE1_D / 2)

    # CirPattern1: #6-32 Tapped Hole1 ×4 about axis
    cirpattern1_axis = Axis((0, 0, 0), (0, 1, 0))
    for i in range(1, CIRPATTERN1_COUNT):
        add(f_6_32_tapped_hole1.rotate(cirpattern1_axis, i * 360 / CIRPATTERN1_COUNT), mode=Mode.SUBTRACT)


solid = part.part
